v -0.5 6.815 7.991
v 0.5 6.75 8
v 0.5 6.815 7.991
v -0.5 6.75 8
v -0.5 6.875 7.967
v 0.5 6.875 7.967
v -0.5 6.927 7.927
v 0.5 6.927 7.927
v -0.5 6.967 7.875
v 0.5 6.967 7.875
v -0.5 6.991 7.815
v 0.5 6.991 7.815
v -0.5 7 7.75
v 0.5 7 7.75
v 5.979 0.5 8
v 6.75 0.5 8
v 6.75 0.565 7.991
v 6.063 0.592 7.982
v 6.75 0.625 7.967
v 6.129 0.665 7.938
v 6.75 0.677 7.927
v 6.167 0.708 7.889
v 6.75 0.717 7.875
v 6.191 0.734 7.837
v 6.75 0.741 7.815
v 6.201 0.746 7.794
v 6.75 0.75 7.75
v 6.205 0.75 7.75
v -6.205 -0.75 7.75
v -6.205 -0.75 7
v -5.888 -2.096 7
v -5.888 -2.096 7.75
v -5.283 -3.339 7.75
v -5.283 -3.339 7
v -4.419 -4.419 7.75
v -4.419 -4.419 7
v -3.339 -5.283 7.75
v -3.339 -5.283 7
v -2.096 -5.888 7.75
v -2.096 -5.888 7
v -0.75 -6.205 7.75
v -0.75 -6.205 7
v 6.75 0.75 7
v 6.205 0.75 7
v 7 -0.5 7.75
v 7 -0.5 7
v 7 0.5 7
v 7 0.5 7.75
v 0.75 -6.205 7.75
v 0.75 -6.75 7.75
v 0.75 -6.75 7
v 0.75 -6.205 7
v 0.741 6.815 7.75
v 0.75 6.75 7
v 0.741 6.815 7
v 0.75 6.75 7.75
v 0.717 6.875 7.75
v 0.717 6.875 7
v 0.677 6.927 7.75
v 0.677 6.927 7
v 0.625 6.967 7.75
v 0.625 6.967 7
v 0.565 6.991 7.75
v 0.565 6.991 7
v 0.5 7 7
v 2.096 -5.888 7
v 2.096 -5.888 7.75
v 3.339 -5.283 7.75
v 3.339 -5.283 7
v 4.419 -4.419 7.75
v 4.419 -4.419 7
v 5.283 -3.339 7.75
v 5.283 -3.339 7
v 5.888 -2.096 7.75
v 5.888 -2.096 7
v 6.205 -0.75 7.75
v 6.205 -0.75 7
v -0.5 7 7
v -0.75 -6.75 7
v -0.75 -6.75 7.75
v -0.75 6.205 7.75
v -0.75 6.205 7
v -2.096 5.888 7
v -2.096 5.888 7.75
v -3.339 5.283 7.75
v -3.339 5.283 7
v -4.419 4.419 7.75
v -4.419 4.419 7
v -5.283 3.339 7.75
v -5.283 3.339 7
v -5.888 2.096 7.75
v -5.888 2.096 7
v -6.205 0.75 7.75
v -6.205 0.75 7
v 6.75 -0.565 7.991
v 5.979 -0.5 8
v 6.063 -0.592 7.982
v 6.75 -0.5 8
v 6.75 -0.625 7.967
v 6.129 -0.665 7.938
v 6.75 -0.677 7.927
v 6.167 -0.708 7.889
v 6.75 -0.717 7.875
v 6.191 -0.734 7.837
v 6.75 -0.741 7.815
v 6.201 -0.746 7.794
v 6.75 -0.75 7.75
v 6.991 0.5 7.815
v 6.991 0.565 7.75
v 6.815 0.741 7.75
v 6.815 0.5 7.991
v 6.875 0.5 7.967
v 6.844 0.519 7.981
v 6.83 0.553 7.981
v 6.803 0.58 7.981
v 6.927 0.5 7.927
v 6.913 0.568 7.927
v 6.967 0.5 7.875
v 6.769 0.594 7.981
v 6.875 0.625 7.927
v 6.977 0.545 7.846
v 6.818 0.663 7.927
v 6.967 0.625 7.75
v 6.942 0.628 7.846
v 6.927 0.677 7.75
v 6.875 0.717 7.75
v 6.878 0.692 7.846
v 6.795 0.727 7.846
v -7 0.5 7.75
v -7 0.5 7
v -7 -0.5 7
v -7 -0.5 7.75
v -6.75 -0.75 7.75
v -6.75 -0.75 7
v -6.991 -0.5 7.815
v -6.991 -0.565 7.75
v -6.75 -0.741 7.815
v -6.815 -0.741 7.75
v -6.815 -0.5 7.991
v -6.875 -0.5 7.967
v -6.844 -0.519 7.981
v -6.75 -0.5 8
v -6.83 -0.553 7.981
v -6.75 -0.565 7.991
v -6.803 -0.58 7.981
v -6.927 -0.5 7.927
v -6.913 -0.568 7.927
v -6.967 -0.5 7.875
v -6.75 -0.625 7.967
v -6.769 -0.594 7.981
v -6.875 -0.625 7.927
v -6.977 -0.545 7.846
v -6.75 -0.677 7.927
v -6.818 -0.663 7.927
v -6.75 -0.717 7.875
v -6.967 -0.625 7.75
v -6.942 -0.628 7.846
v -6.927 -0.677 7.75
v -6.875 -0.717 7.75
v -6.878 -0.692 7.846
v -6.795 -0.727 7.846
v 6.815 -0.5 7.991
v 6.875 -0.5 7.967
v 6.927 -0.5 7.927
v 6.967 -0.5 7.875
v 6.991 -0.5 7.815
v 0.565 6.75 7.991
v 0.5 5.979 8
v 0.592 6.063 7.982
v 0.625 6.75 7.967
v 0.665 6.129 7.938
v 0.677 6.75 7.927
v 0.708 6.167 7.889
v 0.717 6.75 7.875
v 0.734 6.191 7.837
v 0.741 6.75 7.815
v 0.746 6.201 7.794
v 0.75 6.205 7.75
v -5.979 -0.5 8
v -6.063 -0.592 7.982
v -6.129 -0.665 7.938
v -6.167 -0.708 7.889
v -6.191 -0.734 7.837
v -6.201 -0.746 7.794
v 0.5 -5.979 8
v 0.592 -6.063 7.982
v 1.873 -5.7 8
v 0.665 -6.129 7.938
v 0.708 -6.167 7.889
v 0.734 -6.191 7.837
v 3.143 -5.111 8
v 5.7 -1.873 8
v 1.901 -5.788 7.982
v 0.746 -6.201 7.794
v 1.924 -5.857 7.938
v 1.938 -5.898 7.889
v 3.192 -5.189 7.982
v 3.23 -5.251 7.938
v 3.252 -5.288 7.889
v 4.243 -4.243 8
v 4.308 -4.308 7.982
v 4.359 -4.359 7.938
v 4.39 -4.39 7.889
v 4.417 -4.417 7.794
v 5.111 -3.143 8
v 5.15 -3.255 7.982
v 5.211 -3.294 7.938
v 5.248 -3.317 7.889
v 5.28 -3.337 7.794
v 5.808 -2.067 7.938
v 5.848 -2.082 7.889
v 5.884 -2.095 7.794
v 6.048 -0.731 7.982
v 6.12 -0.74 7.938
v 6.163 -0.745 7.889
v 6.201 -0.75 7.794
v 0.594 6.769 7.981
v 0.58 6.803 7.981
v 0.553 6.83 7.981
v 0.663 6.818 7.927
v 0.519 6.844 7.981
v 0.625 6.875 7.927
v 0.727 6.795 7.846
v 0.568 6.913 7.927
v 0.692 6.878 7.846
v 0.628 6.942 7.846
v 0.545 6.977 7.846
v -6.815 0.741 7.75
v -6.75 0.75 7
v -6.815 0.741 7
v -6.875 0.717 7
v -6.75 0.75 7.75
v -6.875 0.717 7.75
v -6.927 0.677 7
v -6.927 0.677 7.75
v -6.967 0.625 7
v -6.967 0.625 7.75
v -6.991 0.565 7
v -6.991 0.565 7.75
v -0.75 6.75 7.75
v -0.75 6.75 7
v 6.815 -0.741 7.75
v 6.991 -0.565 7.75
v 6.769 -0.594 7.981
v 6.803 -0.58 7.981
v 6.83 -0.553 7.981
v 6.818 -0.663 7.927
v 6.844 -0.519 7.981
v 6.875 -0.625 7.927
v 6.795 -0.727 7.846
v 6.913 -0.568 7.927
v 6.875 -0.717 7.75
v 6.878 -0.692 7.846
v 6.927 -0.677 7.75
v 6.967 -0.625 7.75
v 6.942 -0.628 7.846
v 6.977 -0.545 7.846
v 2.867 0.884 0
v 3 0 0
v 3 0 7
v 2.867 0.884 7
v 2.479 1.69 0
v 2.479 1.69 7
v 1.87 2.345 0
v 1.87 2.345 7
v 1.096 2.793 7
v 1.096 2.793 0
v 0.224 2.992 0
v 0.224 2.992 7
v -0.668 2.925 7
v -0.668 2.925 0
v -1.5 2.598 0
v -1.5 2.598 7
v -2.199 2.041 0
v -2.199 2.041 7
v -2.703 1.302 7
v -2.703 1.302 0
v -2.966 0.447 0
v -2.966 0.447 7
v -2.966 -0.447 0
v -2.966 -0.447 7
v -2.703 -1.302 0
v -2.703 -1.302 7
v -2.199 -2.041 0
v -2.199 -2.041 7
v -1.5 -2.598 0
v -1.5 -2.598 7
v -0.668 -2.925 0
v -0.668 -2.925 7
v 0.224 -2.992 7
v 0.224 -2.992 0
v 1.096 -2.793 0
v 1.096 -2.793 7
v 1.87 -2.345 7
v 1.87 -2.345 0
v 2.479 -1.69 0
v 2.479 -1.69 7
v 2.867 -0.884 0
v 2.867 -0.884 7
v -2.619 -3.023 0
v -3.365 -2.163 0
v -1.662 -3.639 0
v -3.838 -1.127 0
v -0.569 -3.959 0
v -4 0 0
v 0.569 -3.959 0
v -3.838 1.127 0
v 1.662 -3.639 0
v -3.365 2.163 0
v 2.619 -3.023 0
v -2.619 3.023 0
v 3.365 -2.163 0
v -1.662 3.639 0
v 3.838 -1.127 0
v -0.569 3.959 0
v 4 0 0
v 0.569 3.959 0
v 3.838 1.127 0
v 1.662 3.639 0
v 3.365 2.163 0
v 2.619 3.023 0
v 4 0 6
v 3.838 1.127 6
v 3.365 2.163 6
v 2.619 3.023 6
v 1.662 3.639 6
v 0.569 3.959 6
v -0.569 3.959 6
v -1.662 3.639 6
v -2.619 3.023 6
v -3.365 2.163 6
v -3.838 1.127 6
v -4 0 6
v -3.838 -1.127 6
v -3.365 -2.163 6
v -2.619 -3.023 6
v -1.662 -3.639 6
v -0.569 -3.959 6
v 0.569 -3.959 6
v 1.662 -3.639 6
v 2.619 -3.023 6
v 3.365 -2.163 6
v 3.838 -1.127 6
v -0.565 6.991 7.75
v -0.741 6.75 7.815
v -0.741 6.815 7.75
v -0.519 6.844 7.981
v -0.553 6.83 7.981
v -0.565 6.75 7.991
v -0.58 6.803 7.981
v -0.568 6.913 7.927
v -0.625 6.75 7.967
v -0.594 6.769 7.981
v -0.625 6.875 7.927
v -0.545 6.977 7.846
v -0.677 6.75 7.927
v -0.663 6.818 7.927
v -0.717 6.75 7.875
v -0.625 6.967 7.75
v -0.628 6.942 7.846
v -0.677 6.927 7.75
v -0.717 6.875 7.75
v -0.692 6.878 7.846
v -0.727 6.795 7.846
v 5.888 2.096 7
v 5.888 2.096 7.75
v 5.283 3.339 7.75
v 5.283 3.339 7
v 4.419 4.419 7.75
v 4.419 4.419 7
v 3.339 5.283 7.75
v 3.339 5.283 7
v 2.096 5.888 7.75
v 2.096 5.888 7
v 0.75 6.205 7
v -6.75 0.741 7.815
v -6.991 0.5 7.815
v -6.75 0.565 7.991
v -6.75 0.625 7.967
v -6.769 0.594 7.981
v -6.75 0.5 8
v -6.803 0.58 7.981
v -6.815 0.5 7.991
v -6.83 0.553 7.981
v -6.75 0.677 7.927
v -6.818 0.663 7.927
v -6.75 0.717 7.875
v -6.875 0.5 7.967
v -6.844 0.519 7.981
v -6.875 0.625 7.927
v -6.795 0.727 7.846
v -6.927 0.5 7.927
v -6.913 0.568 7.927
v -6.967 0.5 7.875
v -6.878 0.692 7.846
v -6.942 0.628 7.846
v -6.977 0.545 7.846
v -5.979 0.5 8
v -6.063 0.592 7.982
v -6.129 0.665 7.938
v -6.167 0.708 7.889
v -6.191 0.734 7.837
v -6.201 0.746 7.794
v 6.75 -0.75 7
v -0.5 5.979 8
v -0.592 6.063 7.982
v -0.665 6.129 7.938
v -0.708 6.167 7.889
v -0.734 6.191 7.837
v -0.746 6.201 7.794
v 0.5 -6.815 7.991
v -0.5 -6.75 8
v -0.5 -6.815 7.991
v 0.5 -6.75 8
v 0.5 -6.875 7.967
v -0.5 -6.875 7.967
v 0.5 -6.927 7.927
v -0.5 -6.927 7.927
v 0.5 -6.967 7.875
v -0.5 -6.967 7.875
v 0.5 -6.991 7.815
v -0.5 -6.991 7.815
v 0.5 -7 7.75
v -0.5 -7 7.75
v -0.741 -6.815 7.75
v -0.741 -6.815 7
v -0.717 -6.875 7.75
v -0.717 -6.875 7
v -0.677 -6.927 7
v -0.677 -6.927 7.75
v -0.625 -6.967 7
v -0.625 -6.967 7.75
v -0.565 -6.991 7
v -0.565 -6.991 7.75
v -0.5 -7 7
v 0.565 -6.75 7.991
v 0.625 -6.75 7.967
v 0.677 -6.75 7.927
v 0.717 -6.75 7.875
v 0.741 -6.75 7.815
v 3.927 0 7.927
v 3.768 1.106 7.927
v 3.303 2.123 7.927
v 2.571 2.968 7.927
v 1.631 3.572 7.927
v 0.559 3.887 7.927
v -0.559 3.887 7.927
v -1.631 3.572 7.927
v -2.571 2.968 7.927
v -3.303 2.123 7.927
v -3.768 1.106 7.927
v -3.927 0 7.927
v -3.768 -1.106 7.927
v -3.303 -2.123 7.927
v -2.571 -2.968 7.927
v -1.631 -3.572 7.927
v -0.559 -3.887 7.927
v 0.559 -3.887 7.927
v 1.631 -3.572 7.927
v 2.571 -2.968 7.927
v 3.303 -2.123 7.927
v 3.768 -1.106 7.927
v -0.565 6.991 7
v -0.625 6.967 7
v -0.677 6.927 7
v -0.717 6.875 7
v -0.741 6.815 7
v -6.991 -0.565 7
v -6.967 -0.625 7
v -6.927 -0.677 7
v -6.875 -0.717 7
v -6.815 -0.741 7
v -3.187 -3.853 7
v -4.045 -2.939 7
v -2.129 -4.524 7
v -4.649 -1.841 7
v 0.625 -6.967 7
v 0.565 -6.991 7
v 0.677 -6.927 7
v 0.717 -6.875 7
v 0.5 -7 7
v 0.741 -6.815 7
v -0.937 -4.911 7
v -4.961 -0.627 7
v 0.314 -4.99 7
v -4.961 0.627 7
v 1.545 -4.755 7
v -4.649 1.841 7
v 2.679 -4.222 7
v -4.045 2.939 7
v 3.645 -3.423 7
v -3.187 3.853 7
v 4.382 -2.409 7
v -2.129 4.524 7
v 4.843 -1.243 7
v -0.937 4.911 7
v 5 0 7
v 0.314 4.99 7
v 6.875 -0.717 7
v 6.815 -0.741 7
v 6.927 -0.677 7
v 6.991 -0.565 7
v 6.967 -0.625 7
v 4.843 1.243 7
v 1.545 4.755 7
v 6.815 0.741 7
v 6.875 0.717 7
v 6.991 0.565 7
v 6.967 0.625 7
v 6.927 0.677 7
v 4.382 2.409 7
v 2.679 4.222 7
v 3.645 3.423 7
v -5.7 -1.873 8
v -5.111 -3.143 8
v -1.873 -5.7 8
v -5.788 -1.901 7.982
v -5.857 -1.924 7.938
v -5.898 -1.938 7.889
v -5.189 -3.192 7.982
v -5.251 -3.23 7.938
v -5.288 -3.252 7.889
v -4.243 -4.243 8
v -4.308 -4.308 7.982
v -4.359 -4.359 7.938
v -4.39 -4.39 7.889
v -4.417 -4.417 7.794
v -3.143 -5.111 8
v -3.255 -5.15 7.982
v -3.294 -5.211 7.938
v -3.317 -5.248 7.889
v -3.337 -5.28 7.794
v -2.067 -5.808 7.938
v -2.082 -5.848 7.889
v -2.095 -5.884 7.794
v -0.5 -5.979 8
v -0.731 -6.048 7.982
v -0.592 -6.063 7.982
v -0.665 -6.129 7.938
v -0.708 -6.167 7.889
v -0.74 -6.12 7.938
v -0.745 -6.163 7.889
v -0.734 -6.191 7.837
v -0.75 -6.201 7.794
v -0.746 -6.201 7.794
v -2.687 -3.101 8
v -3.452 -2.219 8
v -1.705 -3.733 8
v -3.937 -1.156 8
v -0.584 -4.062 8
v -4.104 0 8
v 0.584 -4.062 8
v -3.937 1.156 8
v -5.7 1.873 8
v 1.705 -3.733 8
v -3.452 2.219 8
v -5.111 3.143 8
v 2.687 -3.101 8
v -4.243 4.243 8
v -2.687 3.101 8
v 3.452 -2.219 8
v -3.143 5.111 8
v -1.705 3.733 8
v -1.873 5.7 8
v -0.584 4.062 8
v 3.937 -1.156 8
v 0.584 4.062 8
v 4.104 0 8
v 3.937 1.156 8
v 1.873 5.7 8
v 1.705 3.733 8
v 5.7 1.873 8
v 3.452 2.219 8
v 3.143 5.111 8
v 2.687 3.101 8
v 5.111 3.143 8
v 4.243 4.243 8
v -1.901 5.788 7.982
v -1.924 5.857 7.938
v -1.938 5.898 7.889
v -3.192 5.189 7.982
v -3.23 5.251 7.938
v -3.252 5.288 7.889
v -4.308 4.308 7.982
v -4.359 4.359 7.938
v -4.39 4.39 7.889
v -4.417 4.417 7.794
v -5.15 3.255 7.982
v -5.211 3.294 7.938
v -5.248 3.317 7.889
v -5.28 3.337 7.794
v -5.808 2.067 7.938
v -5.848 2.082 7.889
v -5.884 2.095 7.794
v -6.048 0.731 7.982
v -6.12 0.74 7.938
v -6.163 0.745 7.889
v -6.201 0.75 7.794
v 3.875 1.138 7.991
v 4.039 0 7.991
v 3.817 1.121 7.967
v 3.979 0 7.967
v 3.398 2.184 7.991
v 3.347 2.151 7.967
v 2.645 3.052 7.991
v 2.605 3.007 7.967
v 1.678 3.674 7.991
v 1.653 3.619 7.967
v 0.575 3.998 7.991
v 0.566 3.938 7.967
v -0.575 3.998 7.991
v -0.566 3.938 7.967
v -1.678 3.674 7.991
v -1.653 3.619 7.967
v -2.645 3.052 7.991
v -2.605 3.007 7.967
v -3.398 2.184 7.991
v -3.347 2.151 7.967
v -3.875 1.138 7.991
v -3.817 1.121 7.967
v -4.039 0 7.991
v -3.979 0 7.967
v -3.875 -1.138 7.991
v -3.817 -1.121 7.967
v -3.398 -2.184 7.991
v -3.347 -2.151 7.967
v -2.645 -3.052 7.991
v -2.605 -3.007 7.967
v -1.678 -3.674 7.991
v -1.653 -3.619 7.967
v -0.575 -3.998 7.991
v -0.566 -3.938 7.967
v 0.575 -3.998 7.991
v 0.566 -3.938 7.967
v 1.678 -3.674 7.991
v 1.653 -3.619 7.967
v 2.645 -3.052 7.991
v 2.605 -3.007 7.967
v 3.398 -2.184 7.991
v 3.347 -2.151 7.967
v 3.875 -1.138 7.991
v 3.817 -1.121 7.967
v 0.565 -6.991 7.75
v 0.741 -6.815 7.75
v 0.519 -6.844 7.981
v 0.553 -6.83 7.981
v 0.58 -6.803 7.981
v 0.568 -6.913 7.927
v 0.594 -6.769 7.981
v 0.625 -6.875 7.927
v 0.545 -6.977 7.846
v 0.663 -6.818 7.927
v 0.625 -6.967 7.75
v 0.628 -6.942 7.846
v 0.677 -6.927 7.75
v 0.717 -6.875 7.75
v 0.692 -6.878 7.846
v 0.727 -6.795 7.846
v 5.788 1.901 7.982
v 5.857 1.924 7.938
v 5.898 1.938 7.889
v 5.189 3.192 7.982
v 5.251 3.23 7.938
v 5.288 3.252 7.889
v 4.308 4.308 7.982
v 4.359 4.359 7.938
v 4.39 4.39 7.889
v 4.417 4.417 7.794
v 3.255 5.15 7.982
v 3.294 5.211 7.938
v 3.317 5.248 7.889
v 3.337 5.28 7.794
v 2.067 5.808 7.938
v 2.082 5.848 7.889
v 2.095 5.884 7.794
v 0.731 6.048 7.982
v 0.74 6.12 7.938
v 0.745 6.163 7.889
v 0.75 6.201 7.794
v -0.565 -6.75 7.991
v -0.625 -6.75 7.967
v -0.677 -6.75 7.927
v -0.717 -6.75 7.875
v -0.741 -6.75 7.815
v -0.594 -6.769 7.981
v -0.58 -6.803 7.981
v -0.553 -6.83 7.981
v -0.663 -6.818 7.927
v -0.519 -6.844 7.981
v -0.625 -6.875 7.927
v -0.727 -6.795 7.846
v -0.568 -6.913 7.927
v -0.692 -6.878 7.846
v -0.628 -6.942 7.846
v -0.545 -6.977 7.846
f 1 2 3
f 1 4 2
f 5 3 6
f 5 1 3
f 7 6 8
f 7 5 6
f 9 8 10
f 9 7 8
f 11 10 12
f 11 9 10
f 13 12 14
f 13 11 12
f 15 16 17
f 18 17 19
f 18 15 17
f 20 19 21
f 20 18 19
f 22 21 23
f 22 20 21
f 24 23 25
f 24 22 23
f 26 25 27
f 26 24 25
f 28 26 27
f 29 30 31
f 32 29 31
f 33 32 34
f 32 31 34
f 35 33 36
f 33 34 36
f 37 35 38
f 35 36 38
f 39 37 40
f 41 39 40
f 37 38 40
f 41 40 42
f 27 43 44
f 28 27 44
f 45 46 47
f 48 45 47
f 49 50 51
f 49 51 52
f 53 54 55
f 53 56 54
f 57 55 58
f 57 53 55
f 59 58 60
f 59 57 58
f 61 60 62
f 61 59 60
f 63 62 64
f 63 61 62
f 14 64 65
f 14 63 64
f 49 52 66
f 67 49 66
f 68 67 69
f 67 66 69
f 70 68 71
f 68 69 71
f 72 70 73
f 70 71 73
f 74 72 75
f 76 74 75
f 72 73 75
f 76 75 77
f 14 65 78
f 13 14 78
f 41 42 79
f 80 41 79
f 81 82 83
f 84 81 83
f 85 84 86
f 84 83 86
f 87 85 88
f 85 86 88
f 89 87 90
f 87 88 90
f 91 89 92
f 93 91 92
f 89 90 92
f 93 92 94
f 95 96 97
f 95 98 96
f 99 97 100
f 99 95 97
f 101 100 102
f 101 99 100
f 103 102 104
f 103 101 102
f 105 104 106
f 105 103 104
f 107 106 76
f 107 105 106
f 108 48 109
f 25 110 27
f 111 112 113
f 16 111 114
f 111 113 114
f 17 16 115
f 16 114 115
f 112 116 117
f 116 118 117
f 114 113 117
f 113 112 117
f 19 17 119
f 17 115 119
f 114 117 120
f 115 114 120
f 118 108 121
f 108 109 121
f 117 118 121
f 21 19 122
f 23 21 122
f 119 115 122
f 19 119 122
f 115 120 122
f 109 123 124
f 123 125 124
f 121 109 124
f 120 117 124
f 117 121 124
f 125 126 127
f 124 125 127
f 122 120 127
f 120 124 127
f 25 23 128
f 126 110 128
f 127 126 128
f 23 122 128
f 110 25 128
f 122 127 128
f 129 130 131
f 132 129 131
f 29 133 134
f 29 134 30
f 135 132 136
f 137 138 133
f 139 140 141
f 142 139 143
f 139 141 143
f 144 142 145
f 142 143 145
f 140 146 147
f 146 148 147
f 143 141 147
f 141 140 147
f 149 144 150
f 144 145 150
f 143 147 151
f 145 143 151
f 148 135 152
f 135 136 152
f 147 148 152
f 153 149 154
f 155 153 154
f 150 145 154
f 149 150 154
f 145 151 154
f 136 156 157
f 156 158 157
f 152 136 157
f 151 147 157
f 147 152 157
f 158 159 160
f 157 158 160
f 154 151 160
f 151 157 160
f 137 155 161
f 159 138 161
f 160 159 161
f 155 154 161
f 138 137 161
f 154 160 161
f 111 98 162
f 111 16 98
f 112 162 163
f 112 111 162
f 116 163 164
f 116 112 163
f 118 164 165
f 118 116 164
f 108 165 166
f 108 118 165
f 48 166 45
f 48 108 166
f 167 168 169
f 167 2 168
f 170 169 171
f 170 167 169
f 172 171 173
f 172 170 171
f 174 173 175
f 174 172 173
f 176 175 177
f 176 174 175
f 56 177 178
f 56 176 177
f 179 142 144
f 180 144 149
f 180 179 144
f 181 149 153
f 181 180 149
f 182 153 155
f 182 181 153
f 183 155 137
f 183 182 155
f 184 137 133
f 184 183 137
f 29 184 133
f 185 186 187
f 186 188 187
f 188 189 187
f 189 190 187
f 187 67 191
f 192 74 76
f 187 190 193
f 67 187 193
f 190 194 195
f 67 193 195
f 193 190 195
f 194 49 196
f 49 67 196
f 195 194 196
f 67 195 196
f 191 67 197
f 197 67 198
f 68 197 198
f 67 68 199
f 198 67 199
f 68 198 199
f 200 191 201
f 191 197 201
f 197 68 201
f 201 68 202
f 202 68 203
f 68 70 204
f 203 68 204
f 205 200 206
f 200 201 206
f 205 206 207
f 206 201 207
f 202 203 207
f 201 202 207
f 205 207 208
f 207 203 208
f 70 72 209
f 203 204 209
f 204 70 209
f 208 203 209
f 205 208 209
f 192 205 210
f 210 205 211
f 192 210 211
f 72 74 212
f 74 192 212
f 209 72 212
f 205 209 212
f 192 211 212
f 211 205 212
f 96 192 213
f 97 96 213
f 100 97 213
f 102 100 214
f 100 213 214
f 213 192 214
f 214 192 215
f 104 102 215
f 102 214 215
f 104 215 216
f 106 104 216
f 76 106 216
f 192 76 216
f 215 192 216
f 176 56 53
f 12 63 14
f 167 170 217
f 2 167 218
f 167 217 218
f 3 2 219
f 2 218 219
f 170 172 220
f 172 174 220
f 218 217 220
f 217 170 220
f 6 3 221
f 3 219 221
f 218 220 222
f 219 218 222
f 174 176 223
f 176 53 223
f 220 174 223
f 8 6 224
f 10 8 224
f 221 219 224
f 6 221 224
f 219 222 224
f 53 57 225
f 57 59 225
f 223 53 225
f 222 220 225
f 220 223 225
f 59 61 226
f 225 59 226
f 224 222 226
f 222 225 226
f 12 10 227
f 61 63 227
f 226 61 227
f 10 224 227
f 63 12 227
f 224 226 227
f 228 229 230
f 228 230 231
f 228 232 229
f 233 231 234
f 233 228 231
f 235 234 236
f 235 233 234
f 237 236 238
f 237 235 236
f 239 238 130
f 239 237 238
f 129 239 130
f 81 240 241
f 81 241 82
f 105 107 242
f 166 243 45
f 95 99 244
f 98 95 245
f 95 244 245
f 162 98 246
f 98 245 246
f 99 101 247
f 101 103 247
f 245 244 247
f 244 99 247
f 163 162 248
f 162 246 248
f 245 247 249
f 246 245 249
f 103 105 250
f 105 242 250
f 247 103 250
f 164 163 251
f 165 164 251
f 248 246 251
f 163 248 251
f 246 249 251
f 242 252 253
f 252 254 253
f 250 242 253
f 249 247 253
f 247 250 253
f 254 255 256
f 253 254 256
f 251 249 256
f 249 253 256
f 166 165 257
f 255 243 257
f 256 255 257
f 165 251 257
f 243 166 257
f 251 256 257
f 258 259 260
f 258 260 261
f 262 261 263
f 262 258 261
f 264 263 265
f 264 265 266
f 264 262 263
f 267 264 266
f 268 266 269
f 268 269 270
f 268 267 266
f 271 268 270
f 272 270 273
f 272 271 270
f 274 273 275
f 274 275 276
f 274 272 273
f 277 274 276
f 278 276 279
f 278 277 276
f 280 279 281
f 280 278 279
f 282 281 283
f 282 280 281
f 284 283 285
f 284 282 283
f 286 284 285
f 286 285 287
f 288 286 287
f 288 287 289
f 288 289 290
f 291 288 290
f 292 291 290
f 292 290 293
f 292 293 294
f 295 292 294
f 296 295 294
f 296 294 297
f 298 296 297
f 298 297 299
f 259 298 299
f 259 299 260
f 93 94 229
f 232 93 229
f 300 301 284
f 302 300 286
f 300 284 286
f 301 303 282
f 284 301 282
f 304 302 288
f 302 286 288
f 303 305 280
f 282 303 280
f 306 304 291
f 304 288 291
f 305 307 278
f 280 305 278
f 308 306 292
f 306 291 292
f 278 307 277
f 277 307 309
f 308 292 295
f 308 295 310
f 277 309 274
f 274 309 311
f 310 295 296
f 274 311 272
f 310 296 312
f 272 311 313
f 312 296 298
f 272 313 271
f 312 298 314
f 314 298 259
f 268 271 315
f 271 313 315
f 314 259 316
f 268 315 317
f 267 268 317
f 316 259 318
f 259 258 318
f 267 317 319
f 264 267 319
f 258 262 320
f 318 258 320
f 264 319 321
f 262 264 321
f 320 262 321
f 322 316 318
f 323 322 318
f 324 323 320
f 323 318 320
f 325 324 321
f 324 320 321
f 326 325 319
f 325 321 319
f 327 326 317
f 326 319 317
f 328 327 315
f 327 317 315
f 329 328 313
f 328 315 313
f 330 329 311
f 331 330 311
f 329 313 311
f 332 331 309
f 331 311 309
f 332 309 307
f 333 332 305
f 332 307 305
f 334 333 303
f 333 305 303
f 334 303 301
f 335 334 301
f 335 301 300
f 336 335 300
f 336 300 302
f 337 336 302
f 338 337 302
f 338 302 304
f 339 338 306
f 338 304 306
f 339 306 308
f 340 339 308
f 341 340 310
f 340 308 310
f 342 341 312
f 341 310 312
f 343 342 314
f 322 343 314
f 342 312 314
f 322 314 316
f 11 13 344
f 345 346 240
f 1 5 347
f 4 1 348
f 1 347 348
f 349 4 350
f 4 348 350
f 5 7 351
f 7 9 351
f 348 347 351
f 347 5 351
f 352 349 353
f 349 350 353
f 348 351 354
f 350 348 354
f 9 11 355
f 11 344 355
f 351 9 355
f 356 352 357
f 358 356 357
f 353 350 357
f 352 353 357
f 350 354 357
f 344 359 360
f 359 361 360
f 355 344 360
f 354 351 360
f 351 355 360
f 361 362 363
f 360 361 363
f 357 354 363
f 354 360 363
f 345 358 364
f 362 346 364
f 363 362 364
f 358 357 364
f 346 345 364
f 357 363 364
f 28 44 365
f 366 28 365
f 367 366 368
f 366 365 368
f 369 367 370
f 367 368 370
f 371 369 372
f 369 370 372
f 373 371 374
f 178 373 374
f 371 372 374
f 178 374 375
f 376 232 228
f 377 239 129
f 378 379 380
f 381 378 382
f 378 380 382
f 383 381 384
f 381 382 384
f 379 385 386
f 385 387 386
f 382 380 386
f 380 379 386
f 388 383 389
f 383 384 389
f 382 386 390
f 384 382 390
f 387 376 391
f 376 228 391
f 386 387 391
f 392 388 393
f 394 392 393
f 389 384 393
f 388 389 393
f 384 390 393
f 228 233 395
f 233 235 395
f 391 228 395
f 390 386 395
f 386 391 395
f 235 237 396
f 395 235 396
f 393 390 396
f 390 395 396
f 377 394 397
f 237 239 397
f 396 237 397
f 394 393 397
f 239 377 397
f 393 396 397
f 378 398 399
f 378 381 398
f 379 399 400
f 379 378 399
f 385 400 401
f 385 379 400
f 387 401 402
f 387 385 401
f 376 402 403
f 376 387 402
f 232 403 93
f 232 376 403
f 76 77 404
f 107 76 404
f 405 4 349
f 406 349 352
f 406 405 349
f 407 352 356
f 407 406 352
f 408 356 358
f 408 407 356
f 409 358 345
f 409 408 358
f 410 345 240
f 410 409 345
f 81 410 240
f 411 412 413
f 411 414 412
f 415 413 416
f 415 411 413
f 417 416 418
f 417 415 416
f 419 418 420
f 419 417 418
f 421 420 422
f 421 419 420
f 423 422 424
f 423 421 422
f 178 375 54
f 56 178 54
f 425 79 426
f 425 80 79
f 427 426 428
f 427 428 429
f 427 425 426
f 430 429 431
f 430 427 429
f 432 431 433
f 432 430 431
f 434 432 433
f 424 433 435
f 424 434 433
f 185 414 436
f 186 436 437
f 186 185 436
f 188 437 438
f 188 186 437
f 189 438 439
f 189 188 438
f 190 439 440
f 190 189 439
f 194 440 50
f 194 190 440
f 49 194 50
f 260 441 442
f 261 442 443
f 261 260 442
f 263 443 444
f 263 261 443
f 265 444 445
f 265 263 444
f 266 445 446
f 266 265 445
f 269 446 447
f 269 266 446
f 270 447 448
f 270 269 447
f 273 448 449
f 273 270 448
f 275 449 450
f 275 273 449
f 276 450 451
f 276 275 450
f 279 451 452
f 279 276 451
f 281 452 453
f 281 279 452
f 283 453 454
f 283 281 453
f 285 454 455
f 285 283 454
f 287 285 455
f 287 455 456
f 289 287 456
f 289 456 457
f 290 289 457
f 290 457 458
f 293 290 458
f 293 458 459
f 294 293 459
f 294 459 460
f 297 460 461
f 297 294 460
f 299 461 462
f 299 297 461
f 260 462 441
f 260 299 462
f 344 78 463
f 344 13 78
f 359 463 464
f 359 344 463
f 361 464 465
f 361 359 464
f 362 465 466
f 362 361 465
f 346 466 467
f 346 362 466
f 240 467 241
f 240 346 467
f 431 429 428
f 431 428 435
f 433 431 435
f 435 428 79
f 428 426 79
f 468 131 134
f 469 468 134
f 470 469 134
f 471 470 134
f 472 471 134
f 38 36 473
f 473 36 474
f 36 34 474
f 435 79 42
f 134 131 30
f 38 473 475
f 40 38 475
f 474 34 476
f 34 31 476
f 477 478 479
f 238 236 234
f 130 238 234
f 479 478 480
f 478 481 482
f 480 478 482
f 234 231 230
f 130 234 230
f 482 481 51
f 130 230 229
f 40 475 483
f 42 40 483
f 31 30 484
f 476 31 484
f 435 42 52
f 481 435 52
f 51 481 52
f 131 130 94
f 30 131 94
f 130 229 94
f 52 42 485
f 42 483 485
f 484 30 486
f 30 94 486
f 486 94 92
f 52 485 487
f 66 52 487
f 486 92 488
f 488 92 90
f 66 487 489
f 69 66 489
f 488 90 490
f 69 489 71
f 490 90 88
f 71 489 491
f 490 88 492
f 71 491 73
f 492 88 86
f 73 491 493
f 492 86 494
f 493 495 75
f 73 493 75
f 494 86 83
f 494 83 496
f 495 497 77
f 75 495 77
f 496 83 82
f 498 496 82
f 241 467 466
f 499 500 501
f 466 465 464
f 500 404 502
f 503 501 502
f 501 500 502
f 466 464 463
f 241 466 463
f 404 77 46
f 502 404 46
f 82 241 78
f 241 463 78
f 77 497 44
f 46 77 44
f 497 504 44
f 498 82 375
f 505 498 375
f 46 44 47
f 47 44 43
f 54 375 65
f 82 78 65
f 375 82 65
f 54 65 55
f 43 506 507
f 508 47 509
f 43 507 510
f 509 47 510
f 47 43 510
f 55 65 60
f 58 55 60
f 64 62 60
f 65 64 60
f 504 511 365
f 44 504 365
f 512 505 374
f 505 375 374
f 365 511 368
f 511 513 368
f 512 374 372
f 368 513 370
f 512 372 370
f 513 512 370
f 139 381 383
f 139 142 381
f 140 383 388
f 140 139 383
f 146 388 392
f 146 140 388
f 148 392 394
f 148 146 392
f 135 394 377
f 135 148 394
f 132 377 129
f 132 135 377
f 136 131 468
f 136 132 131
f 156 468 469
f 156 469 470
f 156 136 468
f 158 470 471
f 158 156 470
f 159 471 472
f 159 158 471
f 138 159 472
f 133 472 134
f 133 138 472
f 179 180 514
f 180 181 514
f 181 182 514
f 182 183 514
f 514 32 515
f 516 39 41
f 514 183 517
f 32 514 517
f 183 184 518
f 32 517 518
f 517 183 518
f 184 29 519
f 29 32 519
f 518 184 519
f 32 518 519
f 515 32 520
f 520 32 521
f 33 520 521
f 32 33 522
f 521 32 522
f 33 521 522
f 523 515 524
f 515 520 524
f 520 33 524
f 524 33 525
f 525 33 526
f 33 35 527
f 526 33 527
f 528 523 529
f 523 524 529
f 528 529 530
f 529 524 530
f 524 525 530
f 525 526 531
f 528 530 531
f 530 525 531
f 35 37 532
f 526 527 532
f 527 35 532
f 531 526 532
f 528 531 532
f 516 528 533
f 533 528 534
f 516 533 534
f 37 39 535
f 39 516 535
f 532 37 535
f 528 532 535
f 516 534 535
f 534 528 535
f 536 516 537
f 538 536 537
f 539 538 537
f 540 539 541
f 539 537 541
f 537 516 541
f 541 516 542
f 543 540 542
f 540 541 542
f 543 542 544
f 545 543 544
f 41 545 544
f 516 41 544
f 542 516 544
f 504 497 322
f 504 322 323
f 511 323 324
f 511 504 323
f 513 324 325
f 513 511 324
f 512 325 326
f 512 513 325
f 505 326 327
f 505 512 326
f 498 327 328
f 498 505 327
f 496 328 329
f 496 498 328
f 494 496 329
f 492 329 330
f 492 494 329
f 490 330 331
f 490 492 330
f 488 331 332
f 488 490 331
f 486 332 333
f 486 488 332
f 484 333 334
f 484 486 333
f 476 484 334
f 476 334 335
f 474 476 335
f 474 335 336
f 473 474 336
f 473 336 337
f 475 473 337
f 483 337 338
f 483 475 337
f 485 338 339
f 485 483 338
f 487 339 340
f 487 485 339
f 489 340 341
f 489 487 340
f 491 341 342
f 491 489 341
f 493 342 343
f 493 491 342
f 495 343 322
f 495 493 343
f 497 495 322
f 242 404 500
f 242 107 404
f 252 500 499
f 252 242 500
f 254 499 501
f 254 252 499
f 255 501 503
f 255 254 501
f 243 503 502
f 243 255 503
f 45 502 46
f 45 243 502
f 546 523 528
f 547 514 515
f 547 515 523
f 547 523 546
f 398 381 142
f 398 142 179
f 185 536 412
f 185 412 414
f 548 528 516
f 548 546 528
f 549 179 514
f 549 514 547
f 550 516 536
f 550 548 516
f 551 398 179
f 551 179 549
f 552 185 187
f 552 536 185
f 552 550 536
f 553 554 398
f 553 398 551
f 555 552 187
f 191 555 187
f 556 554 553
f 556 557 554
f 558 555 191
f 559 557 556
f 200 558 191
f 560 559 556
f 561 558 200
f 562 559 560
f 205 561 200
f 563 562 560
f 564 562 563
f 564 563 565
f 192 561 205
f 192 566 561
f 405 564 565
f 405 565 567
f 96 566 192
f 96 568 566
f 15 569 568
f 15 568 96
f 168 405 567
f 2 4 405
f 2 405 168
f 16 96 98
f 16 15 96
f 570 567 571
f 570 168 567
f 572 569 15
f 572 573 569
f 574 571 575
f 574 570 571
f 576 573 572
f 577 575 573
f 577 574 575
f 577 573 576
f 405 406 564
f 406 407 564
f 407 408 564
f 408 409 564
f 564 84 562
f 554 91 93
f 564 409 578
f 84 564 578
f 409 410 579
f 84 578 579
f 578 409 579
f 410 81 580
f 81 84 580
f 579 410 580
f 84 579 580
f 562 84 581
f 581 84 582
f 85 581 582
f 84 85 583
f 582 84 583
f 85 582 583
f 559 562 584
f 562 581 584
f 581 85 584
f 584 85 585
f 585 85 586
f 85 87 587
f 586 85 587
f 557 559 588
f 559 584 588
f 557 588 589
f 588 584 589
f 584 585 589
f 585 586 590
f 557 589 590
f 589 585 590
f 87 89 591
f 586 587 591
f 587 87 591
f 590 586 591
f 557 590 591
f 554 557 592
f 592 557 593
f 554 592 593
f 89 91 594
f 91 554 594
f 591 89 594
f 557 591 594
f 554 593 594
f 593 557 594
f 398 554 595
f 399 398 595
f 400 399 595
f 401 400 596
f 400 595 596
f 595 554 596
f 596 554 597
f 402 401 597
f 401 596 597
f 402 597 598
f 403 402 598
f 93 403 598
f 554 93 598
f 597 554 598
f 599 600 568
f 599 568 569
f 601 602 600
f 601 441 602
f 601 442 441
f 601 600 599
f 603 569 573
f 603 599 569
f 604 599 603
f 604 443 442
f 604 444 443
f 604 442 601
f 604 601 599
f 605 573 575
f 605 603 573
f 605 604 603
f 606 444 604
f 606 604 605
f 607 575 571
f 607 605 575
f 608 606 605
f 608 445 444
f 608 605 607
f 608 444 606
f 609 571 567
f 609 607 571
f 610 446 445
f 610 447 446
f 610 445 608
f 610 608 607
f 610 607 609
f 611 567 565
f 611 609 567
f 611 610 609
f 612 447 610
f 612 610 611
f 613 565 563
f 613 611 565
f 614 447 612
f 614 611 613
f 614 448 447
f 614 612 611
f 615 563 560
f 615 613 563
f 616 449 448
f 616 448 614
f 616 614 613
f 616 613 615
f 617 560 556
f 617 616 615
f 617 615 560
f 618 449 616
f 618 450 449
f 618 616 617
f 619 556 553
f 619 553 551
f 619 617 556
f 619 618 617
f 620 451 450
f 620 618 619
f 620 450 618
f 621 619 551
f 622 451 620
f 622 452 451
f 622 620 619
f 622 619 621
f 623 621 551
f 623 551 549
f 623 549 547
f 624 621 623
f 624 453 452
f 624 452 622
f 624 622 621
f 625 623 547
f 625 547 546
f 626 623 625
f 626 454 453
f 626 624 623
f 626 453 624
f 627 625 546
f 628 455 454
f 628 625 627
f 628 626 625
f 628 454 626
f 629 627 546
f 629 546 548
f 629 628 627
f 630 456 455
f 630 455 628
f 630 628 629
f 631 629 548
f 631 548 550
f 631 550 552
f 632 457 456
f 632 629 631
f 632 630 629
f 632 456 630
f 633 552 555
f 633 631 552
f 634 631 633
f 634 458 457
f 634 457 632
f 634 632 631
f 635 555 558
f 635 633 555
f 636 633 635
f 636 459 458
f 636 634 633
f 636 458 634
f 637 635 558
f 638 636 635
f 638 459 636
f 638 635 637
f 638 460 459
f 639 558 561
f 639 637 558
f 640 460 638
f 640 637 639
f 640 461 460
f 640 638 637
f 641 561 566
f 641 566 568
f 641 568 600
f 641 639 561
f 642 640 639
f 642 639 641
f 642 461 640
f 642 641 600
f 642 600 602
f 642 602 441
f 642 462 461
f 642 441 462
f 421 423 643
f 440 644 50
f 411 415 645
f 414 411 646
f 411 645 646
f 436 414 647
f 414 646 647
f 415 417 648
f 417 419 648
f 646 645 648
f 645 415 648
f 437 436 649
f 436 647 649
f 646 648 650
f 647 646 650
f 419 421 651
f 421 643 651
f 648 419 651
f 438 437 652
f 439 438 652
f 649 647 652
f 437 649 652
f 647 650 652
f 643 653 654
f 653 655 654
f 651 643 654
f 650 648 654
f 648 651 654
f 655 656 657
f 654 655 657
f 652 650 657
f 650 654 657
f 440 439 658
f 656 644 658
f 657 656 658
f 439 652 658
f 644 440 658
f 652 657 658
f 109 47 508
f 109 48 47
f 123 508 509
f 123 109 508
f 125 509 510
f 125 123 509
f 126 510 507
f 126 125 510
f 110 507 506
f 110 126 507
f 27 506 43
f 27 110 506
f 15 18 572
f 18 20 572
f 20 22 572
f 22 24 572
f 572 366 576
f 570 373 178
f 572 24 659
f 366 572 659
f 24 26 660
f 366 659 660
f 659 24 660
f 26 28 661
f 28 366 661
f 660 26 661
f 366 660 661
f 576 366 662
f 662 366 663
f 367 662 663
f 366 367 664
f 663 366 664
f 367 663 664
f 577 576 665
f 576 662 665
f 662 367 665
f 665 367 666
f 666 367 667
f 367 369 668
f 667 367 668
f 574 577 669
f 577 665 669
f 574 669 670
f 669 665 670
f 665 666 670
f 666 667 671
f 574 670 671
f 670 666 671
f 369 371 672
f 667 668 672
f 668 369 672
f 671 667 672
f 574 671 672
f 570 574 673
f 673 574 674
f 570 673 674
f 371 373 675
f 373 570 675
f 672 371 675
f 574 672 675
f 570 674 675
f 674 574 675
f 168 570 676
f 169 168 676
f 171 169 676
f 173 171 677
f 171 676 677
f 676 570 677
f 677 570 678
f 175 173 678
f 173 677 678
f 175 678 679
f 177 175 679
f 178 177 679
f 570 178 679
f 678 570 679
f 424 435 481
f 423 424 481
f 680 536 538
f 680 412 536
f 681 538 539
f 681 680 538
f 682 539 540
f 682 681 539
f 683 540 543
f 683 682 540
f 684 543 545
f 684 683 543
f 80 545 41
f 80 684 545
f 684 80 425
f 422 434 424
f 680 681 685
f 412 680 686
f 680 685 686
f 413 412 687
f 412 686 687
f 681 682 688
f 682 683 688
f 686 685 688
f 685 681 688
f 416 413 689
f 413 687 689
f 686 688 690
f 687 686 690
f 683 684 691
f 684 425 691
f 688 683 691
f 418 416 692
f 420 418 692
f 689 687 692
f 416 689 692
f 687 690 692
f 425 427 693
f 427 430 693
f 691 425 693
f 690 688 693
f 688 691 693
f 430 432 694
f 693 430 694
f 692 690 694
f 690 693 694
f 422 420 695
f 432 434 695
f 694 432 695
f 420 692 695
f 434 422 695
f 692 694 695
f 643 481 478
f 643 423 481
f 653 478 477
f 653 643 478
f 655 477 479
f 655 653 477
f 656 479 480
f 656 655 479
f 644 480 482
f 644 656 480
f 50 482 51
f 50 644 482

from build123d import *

# Parameters (mm, degrees)
F0_R     = 4
F0_R_2   = 3
F1_DEPTH = 7
F2_R     = 3
F3_DEPTH = 1
F4_SIZE  = 1
F5_R     = 0.25


with BuildPart() as f1:
    # F0 (on Top) → F1 (new body)
    with BuildSketch(Plane.XY):
        Circle(F0_R)
        Circle(F0_R_2, mode=Mode.SUBTRACT)
    extrude(amount=F1_DEPTH)

    # F2 (on face) → F3 (join)
    with BuildSketch(Plane.XY.offset(7)):
        with BuildLine():
            ThreePointArc((6.204836823, -0.75), (6.2386989887, -0.3756792889), (6.25, 0))
            ThreePointArc((6.25, 0), (6.2386989887, 0.3756792889), (6.204836823, 0.75))
            Line((6.204836823, 0.75), (5.5, 0.75))
            Line((5.5, 0.75), (5.5, -0.75))
            Line((5.5, -0.75), (6.204836823, -0.75))
        make_face()
        with BuildLine():
            ThreePointArc((6.204836823, 0.75), (6.2386989887, 0.3756792889), (6.25, 0))
            ThreePointArc((6.25, 0), (6.2386989887, -0.3756792889), (6.204836823, -0.75))
            Line((6.204836823, -0.75), (7, -0.75))
            Line((7, -0.75), (7, 0.75))
            Line((7, 0.75), (6.204836823, 0.75))
        make_face()
        with BuildLine():
            Line((5.5, 0.75), (6.204836823, 0.75))
            ThreePointArc((6.204836823, 0.75), (4.4194173824, 4.4194173824), (0.75, 6.204836823))
            Line((0.75, 6.204836823), (0.75, 5.5))
            Line((0.75, 5.5), (-0.75, 5.5))
            Line((-0.75, 5.5), (-0.75, 6.204836823))
            ThreePointArc((-0.75, 6.204836823), (-4.4194173824, 4.4194173824), (-6.204836823, 0.75))
            Line((-6.204836823, 0.75), (-5.5, 0.75))
            Line((-5.5, 0.75), (-5.5, -0.75))
            Line((-5.5, -0.75), (-6.204836823, -0.75))
            ThreePointArc((-6.204836823, -0.75), (-4.4194173824, -4.4194173824), (-0.75, -6.204836823))
            Line((-0.75, -6.204836823), (-0.75, -5.5))
            Line((-0.75, -5.5), (0.75, -5.5))
            Line((0.75, -5.5), (0.75, -6.204836823))
            ThreePointArc((0.75, -6.204836823), (4.4194173824, -4.4194173824), (6.204836823, -0.75))
            Line((6.204836823, -0.75), (5.5, -0.75))
            Line((5.5, -0.75), (5.5, 0.75))
        make_face()
        Circle(F2_R, mode=Mode.SUBTRACT)
        with BuildLine():
            Line((0.75, 5.5), (0.75, 6.204836823))
            ThreePointArc((0.75, 6.204836823), (0, 6.25), (-0.75, 6.204836823))
            Line((-0.75, 6.204836823), (-0.75, 5.5))
            Line((-0.75, 5.5), (0.75, 5.5))
        make_face()
        with BuildLine():
            ThreePointArc((-0.75, 6.204836823), (0, 6.25), (0.75, 6.204836823))
            Line((0.75, 6.204836823), (0.75, 7))
            Line((0.75, 7), (-0.75, 7))
            Line((-0.75, 7), (-0.75, 6.204836823))
        make_face()
        with BuildLine():
            Line((0.75, -7), (0.75, -6.204836823))
            ThreePointArc((0.75, -6.204836823), (0, -6.25), (-0.75, -6.204836823))
            Line((-0.75, -6.204836823), (-0.75, -7))
            Line((-0.75, -7), (0.75, -7))
        make_face()
        with BuildLine():
            ThreePointArc((-0.75, -6.204836823), (0, -6.25), (0.75, -6.204836823))
            Line((0.75, -6.204836823), (0.75, -5.5))
            Line((0.75, -5.5), (-0.75, -5.5))
            Line((-0.75, -5.5), (-0.75, -6.204836823))
        make_face()
        with BuildLine():
            Line((-5.5, 0.75), (-6.204836823, 0.75))
            ThreePointArc((-6.204836823, 0.75), (-6.25, 0), (-6.204836823, -0.75))
            Line((-6.204836823, -0.75), (-5.5, -0.75))
            Line((-5.5, -0.75), (-5.5, 0.75))
        make_face()
        with BuildLine():
            ThreePointArc((-6.204836823, -0.75), (-6.25, 0), (-6.204836823, 0.75))
            Line((-6.204836823, 0.75), (-7, 0.75))
            Line((-7, 0.75), (-7, -0.75))
            Line((-7, -0.75), (-6.204836823, -0.75))
        make_face()
    extrude(amount=F3_DEPTH)

    # F4
    f4_edges = [f1.edges().sort_by_distance(p)[0] for p in [
        (-3, 0, 8),
        (-4, 0, 7),
    ]]
    chamfer(f4_edges, length=F4_SIZE)

    # F5
    f5_edges = [f1.edges().sort_by_distance(p)[0] for p in [
        (-7, -0.75, 7.5),
        (-7, 0.75, 7.5),
        (-0.75, -7, 7.5),
        (0.75, -7, 7.5),
        (7, -0.75, 7.5),
        (7, 0.75, 7.5),
        (0.75, 7, 7.5),
        (-0.75, 7, 7.5),
        (-4, 0, 8),
        (6.602418, -0.75, 8),
        (7, 0, 8),
        (6.602418, 0.75, 8),
        (4.419417, 4.419417, 8),
        (0.75, 6.602418, 8),
        (0, 7, 8),
        (-0.75, 6.602418, 8),
        (-4.419417, 4.419417, 8),
        (-6.602418, 0.75, 8),
        (-7, 0, 8),
        (-6.602418, -0.75, 8),
        (-4.419417, -4.419417, 8),
        (-0.75, -6.602418, 8),
        (0, -7, 8),
        (0.75, -6.602418, 8),
        (4.419417, -4.419417, 8),
    ]]
    fillet(f5_edges, radius=F5_R)


solid = f1.part
